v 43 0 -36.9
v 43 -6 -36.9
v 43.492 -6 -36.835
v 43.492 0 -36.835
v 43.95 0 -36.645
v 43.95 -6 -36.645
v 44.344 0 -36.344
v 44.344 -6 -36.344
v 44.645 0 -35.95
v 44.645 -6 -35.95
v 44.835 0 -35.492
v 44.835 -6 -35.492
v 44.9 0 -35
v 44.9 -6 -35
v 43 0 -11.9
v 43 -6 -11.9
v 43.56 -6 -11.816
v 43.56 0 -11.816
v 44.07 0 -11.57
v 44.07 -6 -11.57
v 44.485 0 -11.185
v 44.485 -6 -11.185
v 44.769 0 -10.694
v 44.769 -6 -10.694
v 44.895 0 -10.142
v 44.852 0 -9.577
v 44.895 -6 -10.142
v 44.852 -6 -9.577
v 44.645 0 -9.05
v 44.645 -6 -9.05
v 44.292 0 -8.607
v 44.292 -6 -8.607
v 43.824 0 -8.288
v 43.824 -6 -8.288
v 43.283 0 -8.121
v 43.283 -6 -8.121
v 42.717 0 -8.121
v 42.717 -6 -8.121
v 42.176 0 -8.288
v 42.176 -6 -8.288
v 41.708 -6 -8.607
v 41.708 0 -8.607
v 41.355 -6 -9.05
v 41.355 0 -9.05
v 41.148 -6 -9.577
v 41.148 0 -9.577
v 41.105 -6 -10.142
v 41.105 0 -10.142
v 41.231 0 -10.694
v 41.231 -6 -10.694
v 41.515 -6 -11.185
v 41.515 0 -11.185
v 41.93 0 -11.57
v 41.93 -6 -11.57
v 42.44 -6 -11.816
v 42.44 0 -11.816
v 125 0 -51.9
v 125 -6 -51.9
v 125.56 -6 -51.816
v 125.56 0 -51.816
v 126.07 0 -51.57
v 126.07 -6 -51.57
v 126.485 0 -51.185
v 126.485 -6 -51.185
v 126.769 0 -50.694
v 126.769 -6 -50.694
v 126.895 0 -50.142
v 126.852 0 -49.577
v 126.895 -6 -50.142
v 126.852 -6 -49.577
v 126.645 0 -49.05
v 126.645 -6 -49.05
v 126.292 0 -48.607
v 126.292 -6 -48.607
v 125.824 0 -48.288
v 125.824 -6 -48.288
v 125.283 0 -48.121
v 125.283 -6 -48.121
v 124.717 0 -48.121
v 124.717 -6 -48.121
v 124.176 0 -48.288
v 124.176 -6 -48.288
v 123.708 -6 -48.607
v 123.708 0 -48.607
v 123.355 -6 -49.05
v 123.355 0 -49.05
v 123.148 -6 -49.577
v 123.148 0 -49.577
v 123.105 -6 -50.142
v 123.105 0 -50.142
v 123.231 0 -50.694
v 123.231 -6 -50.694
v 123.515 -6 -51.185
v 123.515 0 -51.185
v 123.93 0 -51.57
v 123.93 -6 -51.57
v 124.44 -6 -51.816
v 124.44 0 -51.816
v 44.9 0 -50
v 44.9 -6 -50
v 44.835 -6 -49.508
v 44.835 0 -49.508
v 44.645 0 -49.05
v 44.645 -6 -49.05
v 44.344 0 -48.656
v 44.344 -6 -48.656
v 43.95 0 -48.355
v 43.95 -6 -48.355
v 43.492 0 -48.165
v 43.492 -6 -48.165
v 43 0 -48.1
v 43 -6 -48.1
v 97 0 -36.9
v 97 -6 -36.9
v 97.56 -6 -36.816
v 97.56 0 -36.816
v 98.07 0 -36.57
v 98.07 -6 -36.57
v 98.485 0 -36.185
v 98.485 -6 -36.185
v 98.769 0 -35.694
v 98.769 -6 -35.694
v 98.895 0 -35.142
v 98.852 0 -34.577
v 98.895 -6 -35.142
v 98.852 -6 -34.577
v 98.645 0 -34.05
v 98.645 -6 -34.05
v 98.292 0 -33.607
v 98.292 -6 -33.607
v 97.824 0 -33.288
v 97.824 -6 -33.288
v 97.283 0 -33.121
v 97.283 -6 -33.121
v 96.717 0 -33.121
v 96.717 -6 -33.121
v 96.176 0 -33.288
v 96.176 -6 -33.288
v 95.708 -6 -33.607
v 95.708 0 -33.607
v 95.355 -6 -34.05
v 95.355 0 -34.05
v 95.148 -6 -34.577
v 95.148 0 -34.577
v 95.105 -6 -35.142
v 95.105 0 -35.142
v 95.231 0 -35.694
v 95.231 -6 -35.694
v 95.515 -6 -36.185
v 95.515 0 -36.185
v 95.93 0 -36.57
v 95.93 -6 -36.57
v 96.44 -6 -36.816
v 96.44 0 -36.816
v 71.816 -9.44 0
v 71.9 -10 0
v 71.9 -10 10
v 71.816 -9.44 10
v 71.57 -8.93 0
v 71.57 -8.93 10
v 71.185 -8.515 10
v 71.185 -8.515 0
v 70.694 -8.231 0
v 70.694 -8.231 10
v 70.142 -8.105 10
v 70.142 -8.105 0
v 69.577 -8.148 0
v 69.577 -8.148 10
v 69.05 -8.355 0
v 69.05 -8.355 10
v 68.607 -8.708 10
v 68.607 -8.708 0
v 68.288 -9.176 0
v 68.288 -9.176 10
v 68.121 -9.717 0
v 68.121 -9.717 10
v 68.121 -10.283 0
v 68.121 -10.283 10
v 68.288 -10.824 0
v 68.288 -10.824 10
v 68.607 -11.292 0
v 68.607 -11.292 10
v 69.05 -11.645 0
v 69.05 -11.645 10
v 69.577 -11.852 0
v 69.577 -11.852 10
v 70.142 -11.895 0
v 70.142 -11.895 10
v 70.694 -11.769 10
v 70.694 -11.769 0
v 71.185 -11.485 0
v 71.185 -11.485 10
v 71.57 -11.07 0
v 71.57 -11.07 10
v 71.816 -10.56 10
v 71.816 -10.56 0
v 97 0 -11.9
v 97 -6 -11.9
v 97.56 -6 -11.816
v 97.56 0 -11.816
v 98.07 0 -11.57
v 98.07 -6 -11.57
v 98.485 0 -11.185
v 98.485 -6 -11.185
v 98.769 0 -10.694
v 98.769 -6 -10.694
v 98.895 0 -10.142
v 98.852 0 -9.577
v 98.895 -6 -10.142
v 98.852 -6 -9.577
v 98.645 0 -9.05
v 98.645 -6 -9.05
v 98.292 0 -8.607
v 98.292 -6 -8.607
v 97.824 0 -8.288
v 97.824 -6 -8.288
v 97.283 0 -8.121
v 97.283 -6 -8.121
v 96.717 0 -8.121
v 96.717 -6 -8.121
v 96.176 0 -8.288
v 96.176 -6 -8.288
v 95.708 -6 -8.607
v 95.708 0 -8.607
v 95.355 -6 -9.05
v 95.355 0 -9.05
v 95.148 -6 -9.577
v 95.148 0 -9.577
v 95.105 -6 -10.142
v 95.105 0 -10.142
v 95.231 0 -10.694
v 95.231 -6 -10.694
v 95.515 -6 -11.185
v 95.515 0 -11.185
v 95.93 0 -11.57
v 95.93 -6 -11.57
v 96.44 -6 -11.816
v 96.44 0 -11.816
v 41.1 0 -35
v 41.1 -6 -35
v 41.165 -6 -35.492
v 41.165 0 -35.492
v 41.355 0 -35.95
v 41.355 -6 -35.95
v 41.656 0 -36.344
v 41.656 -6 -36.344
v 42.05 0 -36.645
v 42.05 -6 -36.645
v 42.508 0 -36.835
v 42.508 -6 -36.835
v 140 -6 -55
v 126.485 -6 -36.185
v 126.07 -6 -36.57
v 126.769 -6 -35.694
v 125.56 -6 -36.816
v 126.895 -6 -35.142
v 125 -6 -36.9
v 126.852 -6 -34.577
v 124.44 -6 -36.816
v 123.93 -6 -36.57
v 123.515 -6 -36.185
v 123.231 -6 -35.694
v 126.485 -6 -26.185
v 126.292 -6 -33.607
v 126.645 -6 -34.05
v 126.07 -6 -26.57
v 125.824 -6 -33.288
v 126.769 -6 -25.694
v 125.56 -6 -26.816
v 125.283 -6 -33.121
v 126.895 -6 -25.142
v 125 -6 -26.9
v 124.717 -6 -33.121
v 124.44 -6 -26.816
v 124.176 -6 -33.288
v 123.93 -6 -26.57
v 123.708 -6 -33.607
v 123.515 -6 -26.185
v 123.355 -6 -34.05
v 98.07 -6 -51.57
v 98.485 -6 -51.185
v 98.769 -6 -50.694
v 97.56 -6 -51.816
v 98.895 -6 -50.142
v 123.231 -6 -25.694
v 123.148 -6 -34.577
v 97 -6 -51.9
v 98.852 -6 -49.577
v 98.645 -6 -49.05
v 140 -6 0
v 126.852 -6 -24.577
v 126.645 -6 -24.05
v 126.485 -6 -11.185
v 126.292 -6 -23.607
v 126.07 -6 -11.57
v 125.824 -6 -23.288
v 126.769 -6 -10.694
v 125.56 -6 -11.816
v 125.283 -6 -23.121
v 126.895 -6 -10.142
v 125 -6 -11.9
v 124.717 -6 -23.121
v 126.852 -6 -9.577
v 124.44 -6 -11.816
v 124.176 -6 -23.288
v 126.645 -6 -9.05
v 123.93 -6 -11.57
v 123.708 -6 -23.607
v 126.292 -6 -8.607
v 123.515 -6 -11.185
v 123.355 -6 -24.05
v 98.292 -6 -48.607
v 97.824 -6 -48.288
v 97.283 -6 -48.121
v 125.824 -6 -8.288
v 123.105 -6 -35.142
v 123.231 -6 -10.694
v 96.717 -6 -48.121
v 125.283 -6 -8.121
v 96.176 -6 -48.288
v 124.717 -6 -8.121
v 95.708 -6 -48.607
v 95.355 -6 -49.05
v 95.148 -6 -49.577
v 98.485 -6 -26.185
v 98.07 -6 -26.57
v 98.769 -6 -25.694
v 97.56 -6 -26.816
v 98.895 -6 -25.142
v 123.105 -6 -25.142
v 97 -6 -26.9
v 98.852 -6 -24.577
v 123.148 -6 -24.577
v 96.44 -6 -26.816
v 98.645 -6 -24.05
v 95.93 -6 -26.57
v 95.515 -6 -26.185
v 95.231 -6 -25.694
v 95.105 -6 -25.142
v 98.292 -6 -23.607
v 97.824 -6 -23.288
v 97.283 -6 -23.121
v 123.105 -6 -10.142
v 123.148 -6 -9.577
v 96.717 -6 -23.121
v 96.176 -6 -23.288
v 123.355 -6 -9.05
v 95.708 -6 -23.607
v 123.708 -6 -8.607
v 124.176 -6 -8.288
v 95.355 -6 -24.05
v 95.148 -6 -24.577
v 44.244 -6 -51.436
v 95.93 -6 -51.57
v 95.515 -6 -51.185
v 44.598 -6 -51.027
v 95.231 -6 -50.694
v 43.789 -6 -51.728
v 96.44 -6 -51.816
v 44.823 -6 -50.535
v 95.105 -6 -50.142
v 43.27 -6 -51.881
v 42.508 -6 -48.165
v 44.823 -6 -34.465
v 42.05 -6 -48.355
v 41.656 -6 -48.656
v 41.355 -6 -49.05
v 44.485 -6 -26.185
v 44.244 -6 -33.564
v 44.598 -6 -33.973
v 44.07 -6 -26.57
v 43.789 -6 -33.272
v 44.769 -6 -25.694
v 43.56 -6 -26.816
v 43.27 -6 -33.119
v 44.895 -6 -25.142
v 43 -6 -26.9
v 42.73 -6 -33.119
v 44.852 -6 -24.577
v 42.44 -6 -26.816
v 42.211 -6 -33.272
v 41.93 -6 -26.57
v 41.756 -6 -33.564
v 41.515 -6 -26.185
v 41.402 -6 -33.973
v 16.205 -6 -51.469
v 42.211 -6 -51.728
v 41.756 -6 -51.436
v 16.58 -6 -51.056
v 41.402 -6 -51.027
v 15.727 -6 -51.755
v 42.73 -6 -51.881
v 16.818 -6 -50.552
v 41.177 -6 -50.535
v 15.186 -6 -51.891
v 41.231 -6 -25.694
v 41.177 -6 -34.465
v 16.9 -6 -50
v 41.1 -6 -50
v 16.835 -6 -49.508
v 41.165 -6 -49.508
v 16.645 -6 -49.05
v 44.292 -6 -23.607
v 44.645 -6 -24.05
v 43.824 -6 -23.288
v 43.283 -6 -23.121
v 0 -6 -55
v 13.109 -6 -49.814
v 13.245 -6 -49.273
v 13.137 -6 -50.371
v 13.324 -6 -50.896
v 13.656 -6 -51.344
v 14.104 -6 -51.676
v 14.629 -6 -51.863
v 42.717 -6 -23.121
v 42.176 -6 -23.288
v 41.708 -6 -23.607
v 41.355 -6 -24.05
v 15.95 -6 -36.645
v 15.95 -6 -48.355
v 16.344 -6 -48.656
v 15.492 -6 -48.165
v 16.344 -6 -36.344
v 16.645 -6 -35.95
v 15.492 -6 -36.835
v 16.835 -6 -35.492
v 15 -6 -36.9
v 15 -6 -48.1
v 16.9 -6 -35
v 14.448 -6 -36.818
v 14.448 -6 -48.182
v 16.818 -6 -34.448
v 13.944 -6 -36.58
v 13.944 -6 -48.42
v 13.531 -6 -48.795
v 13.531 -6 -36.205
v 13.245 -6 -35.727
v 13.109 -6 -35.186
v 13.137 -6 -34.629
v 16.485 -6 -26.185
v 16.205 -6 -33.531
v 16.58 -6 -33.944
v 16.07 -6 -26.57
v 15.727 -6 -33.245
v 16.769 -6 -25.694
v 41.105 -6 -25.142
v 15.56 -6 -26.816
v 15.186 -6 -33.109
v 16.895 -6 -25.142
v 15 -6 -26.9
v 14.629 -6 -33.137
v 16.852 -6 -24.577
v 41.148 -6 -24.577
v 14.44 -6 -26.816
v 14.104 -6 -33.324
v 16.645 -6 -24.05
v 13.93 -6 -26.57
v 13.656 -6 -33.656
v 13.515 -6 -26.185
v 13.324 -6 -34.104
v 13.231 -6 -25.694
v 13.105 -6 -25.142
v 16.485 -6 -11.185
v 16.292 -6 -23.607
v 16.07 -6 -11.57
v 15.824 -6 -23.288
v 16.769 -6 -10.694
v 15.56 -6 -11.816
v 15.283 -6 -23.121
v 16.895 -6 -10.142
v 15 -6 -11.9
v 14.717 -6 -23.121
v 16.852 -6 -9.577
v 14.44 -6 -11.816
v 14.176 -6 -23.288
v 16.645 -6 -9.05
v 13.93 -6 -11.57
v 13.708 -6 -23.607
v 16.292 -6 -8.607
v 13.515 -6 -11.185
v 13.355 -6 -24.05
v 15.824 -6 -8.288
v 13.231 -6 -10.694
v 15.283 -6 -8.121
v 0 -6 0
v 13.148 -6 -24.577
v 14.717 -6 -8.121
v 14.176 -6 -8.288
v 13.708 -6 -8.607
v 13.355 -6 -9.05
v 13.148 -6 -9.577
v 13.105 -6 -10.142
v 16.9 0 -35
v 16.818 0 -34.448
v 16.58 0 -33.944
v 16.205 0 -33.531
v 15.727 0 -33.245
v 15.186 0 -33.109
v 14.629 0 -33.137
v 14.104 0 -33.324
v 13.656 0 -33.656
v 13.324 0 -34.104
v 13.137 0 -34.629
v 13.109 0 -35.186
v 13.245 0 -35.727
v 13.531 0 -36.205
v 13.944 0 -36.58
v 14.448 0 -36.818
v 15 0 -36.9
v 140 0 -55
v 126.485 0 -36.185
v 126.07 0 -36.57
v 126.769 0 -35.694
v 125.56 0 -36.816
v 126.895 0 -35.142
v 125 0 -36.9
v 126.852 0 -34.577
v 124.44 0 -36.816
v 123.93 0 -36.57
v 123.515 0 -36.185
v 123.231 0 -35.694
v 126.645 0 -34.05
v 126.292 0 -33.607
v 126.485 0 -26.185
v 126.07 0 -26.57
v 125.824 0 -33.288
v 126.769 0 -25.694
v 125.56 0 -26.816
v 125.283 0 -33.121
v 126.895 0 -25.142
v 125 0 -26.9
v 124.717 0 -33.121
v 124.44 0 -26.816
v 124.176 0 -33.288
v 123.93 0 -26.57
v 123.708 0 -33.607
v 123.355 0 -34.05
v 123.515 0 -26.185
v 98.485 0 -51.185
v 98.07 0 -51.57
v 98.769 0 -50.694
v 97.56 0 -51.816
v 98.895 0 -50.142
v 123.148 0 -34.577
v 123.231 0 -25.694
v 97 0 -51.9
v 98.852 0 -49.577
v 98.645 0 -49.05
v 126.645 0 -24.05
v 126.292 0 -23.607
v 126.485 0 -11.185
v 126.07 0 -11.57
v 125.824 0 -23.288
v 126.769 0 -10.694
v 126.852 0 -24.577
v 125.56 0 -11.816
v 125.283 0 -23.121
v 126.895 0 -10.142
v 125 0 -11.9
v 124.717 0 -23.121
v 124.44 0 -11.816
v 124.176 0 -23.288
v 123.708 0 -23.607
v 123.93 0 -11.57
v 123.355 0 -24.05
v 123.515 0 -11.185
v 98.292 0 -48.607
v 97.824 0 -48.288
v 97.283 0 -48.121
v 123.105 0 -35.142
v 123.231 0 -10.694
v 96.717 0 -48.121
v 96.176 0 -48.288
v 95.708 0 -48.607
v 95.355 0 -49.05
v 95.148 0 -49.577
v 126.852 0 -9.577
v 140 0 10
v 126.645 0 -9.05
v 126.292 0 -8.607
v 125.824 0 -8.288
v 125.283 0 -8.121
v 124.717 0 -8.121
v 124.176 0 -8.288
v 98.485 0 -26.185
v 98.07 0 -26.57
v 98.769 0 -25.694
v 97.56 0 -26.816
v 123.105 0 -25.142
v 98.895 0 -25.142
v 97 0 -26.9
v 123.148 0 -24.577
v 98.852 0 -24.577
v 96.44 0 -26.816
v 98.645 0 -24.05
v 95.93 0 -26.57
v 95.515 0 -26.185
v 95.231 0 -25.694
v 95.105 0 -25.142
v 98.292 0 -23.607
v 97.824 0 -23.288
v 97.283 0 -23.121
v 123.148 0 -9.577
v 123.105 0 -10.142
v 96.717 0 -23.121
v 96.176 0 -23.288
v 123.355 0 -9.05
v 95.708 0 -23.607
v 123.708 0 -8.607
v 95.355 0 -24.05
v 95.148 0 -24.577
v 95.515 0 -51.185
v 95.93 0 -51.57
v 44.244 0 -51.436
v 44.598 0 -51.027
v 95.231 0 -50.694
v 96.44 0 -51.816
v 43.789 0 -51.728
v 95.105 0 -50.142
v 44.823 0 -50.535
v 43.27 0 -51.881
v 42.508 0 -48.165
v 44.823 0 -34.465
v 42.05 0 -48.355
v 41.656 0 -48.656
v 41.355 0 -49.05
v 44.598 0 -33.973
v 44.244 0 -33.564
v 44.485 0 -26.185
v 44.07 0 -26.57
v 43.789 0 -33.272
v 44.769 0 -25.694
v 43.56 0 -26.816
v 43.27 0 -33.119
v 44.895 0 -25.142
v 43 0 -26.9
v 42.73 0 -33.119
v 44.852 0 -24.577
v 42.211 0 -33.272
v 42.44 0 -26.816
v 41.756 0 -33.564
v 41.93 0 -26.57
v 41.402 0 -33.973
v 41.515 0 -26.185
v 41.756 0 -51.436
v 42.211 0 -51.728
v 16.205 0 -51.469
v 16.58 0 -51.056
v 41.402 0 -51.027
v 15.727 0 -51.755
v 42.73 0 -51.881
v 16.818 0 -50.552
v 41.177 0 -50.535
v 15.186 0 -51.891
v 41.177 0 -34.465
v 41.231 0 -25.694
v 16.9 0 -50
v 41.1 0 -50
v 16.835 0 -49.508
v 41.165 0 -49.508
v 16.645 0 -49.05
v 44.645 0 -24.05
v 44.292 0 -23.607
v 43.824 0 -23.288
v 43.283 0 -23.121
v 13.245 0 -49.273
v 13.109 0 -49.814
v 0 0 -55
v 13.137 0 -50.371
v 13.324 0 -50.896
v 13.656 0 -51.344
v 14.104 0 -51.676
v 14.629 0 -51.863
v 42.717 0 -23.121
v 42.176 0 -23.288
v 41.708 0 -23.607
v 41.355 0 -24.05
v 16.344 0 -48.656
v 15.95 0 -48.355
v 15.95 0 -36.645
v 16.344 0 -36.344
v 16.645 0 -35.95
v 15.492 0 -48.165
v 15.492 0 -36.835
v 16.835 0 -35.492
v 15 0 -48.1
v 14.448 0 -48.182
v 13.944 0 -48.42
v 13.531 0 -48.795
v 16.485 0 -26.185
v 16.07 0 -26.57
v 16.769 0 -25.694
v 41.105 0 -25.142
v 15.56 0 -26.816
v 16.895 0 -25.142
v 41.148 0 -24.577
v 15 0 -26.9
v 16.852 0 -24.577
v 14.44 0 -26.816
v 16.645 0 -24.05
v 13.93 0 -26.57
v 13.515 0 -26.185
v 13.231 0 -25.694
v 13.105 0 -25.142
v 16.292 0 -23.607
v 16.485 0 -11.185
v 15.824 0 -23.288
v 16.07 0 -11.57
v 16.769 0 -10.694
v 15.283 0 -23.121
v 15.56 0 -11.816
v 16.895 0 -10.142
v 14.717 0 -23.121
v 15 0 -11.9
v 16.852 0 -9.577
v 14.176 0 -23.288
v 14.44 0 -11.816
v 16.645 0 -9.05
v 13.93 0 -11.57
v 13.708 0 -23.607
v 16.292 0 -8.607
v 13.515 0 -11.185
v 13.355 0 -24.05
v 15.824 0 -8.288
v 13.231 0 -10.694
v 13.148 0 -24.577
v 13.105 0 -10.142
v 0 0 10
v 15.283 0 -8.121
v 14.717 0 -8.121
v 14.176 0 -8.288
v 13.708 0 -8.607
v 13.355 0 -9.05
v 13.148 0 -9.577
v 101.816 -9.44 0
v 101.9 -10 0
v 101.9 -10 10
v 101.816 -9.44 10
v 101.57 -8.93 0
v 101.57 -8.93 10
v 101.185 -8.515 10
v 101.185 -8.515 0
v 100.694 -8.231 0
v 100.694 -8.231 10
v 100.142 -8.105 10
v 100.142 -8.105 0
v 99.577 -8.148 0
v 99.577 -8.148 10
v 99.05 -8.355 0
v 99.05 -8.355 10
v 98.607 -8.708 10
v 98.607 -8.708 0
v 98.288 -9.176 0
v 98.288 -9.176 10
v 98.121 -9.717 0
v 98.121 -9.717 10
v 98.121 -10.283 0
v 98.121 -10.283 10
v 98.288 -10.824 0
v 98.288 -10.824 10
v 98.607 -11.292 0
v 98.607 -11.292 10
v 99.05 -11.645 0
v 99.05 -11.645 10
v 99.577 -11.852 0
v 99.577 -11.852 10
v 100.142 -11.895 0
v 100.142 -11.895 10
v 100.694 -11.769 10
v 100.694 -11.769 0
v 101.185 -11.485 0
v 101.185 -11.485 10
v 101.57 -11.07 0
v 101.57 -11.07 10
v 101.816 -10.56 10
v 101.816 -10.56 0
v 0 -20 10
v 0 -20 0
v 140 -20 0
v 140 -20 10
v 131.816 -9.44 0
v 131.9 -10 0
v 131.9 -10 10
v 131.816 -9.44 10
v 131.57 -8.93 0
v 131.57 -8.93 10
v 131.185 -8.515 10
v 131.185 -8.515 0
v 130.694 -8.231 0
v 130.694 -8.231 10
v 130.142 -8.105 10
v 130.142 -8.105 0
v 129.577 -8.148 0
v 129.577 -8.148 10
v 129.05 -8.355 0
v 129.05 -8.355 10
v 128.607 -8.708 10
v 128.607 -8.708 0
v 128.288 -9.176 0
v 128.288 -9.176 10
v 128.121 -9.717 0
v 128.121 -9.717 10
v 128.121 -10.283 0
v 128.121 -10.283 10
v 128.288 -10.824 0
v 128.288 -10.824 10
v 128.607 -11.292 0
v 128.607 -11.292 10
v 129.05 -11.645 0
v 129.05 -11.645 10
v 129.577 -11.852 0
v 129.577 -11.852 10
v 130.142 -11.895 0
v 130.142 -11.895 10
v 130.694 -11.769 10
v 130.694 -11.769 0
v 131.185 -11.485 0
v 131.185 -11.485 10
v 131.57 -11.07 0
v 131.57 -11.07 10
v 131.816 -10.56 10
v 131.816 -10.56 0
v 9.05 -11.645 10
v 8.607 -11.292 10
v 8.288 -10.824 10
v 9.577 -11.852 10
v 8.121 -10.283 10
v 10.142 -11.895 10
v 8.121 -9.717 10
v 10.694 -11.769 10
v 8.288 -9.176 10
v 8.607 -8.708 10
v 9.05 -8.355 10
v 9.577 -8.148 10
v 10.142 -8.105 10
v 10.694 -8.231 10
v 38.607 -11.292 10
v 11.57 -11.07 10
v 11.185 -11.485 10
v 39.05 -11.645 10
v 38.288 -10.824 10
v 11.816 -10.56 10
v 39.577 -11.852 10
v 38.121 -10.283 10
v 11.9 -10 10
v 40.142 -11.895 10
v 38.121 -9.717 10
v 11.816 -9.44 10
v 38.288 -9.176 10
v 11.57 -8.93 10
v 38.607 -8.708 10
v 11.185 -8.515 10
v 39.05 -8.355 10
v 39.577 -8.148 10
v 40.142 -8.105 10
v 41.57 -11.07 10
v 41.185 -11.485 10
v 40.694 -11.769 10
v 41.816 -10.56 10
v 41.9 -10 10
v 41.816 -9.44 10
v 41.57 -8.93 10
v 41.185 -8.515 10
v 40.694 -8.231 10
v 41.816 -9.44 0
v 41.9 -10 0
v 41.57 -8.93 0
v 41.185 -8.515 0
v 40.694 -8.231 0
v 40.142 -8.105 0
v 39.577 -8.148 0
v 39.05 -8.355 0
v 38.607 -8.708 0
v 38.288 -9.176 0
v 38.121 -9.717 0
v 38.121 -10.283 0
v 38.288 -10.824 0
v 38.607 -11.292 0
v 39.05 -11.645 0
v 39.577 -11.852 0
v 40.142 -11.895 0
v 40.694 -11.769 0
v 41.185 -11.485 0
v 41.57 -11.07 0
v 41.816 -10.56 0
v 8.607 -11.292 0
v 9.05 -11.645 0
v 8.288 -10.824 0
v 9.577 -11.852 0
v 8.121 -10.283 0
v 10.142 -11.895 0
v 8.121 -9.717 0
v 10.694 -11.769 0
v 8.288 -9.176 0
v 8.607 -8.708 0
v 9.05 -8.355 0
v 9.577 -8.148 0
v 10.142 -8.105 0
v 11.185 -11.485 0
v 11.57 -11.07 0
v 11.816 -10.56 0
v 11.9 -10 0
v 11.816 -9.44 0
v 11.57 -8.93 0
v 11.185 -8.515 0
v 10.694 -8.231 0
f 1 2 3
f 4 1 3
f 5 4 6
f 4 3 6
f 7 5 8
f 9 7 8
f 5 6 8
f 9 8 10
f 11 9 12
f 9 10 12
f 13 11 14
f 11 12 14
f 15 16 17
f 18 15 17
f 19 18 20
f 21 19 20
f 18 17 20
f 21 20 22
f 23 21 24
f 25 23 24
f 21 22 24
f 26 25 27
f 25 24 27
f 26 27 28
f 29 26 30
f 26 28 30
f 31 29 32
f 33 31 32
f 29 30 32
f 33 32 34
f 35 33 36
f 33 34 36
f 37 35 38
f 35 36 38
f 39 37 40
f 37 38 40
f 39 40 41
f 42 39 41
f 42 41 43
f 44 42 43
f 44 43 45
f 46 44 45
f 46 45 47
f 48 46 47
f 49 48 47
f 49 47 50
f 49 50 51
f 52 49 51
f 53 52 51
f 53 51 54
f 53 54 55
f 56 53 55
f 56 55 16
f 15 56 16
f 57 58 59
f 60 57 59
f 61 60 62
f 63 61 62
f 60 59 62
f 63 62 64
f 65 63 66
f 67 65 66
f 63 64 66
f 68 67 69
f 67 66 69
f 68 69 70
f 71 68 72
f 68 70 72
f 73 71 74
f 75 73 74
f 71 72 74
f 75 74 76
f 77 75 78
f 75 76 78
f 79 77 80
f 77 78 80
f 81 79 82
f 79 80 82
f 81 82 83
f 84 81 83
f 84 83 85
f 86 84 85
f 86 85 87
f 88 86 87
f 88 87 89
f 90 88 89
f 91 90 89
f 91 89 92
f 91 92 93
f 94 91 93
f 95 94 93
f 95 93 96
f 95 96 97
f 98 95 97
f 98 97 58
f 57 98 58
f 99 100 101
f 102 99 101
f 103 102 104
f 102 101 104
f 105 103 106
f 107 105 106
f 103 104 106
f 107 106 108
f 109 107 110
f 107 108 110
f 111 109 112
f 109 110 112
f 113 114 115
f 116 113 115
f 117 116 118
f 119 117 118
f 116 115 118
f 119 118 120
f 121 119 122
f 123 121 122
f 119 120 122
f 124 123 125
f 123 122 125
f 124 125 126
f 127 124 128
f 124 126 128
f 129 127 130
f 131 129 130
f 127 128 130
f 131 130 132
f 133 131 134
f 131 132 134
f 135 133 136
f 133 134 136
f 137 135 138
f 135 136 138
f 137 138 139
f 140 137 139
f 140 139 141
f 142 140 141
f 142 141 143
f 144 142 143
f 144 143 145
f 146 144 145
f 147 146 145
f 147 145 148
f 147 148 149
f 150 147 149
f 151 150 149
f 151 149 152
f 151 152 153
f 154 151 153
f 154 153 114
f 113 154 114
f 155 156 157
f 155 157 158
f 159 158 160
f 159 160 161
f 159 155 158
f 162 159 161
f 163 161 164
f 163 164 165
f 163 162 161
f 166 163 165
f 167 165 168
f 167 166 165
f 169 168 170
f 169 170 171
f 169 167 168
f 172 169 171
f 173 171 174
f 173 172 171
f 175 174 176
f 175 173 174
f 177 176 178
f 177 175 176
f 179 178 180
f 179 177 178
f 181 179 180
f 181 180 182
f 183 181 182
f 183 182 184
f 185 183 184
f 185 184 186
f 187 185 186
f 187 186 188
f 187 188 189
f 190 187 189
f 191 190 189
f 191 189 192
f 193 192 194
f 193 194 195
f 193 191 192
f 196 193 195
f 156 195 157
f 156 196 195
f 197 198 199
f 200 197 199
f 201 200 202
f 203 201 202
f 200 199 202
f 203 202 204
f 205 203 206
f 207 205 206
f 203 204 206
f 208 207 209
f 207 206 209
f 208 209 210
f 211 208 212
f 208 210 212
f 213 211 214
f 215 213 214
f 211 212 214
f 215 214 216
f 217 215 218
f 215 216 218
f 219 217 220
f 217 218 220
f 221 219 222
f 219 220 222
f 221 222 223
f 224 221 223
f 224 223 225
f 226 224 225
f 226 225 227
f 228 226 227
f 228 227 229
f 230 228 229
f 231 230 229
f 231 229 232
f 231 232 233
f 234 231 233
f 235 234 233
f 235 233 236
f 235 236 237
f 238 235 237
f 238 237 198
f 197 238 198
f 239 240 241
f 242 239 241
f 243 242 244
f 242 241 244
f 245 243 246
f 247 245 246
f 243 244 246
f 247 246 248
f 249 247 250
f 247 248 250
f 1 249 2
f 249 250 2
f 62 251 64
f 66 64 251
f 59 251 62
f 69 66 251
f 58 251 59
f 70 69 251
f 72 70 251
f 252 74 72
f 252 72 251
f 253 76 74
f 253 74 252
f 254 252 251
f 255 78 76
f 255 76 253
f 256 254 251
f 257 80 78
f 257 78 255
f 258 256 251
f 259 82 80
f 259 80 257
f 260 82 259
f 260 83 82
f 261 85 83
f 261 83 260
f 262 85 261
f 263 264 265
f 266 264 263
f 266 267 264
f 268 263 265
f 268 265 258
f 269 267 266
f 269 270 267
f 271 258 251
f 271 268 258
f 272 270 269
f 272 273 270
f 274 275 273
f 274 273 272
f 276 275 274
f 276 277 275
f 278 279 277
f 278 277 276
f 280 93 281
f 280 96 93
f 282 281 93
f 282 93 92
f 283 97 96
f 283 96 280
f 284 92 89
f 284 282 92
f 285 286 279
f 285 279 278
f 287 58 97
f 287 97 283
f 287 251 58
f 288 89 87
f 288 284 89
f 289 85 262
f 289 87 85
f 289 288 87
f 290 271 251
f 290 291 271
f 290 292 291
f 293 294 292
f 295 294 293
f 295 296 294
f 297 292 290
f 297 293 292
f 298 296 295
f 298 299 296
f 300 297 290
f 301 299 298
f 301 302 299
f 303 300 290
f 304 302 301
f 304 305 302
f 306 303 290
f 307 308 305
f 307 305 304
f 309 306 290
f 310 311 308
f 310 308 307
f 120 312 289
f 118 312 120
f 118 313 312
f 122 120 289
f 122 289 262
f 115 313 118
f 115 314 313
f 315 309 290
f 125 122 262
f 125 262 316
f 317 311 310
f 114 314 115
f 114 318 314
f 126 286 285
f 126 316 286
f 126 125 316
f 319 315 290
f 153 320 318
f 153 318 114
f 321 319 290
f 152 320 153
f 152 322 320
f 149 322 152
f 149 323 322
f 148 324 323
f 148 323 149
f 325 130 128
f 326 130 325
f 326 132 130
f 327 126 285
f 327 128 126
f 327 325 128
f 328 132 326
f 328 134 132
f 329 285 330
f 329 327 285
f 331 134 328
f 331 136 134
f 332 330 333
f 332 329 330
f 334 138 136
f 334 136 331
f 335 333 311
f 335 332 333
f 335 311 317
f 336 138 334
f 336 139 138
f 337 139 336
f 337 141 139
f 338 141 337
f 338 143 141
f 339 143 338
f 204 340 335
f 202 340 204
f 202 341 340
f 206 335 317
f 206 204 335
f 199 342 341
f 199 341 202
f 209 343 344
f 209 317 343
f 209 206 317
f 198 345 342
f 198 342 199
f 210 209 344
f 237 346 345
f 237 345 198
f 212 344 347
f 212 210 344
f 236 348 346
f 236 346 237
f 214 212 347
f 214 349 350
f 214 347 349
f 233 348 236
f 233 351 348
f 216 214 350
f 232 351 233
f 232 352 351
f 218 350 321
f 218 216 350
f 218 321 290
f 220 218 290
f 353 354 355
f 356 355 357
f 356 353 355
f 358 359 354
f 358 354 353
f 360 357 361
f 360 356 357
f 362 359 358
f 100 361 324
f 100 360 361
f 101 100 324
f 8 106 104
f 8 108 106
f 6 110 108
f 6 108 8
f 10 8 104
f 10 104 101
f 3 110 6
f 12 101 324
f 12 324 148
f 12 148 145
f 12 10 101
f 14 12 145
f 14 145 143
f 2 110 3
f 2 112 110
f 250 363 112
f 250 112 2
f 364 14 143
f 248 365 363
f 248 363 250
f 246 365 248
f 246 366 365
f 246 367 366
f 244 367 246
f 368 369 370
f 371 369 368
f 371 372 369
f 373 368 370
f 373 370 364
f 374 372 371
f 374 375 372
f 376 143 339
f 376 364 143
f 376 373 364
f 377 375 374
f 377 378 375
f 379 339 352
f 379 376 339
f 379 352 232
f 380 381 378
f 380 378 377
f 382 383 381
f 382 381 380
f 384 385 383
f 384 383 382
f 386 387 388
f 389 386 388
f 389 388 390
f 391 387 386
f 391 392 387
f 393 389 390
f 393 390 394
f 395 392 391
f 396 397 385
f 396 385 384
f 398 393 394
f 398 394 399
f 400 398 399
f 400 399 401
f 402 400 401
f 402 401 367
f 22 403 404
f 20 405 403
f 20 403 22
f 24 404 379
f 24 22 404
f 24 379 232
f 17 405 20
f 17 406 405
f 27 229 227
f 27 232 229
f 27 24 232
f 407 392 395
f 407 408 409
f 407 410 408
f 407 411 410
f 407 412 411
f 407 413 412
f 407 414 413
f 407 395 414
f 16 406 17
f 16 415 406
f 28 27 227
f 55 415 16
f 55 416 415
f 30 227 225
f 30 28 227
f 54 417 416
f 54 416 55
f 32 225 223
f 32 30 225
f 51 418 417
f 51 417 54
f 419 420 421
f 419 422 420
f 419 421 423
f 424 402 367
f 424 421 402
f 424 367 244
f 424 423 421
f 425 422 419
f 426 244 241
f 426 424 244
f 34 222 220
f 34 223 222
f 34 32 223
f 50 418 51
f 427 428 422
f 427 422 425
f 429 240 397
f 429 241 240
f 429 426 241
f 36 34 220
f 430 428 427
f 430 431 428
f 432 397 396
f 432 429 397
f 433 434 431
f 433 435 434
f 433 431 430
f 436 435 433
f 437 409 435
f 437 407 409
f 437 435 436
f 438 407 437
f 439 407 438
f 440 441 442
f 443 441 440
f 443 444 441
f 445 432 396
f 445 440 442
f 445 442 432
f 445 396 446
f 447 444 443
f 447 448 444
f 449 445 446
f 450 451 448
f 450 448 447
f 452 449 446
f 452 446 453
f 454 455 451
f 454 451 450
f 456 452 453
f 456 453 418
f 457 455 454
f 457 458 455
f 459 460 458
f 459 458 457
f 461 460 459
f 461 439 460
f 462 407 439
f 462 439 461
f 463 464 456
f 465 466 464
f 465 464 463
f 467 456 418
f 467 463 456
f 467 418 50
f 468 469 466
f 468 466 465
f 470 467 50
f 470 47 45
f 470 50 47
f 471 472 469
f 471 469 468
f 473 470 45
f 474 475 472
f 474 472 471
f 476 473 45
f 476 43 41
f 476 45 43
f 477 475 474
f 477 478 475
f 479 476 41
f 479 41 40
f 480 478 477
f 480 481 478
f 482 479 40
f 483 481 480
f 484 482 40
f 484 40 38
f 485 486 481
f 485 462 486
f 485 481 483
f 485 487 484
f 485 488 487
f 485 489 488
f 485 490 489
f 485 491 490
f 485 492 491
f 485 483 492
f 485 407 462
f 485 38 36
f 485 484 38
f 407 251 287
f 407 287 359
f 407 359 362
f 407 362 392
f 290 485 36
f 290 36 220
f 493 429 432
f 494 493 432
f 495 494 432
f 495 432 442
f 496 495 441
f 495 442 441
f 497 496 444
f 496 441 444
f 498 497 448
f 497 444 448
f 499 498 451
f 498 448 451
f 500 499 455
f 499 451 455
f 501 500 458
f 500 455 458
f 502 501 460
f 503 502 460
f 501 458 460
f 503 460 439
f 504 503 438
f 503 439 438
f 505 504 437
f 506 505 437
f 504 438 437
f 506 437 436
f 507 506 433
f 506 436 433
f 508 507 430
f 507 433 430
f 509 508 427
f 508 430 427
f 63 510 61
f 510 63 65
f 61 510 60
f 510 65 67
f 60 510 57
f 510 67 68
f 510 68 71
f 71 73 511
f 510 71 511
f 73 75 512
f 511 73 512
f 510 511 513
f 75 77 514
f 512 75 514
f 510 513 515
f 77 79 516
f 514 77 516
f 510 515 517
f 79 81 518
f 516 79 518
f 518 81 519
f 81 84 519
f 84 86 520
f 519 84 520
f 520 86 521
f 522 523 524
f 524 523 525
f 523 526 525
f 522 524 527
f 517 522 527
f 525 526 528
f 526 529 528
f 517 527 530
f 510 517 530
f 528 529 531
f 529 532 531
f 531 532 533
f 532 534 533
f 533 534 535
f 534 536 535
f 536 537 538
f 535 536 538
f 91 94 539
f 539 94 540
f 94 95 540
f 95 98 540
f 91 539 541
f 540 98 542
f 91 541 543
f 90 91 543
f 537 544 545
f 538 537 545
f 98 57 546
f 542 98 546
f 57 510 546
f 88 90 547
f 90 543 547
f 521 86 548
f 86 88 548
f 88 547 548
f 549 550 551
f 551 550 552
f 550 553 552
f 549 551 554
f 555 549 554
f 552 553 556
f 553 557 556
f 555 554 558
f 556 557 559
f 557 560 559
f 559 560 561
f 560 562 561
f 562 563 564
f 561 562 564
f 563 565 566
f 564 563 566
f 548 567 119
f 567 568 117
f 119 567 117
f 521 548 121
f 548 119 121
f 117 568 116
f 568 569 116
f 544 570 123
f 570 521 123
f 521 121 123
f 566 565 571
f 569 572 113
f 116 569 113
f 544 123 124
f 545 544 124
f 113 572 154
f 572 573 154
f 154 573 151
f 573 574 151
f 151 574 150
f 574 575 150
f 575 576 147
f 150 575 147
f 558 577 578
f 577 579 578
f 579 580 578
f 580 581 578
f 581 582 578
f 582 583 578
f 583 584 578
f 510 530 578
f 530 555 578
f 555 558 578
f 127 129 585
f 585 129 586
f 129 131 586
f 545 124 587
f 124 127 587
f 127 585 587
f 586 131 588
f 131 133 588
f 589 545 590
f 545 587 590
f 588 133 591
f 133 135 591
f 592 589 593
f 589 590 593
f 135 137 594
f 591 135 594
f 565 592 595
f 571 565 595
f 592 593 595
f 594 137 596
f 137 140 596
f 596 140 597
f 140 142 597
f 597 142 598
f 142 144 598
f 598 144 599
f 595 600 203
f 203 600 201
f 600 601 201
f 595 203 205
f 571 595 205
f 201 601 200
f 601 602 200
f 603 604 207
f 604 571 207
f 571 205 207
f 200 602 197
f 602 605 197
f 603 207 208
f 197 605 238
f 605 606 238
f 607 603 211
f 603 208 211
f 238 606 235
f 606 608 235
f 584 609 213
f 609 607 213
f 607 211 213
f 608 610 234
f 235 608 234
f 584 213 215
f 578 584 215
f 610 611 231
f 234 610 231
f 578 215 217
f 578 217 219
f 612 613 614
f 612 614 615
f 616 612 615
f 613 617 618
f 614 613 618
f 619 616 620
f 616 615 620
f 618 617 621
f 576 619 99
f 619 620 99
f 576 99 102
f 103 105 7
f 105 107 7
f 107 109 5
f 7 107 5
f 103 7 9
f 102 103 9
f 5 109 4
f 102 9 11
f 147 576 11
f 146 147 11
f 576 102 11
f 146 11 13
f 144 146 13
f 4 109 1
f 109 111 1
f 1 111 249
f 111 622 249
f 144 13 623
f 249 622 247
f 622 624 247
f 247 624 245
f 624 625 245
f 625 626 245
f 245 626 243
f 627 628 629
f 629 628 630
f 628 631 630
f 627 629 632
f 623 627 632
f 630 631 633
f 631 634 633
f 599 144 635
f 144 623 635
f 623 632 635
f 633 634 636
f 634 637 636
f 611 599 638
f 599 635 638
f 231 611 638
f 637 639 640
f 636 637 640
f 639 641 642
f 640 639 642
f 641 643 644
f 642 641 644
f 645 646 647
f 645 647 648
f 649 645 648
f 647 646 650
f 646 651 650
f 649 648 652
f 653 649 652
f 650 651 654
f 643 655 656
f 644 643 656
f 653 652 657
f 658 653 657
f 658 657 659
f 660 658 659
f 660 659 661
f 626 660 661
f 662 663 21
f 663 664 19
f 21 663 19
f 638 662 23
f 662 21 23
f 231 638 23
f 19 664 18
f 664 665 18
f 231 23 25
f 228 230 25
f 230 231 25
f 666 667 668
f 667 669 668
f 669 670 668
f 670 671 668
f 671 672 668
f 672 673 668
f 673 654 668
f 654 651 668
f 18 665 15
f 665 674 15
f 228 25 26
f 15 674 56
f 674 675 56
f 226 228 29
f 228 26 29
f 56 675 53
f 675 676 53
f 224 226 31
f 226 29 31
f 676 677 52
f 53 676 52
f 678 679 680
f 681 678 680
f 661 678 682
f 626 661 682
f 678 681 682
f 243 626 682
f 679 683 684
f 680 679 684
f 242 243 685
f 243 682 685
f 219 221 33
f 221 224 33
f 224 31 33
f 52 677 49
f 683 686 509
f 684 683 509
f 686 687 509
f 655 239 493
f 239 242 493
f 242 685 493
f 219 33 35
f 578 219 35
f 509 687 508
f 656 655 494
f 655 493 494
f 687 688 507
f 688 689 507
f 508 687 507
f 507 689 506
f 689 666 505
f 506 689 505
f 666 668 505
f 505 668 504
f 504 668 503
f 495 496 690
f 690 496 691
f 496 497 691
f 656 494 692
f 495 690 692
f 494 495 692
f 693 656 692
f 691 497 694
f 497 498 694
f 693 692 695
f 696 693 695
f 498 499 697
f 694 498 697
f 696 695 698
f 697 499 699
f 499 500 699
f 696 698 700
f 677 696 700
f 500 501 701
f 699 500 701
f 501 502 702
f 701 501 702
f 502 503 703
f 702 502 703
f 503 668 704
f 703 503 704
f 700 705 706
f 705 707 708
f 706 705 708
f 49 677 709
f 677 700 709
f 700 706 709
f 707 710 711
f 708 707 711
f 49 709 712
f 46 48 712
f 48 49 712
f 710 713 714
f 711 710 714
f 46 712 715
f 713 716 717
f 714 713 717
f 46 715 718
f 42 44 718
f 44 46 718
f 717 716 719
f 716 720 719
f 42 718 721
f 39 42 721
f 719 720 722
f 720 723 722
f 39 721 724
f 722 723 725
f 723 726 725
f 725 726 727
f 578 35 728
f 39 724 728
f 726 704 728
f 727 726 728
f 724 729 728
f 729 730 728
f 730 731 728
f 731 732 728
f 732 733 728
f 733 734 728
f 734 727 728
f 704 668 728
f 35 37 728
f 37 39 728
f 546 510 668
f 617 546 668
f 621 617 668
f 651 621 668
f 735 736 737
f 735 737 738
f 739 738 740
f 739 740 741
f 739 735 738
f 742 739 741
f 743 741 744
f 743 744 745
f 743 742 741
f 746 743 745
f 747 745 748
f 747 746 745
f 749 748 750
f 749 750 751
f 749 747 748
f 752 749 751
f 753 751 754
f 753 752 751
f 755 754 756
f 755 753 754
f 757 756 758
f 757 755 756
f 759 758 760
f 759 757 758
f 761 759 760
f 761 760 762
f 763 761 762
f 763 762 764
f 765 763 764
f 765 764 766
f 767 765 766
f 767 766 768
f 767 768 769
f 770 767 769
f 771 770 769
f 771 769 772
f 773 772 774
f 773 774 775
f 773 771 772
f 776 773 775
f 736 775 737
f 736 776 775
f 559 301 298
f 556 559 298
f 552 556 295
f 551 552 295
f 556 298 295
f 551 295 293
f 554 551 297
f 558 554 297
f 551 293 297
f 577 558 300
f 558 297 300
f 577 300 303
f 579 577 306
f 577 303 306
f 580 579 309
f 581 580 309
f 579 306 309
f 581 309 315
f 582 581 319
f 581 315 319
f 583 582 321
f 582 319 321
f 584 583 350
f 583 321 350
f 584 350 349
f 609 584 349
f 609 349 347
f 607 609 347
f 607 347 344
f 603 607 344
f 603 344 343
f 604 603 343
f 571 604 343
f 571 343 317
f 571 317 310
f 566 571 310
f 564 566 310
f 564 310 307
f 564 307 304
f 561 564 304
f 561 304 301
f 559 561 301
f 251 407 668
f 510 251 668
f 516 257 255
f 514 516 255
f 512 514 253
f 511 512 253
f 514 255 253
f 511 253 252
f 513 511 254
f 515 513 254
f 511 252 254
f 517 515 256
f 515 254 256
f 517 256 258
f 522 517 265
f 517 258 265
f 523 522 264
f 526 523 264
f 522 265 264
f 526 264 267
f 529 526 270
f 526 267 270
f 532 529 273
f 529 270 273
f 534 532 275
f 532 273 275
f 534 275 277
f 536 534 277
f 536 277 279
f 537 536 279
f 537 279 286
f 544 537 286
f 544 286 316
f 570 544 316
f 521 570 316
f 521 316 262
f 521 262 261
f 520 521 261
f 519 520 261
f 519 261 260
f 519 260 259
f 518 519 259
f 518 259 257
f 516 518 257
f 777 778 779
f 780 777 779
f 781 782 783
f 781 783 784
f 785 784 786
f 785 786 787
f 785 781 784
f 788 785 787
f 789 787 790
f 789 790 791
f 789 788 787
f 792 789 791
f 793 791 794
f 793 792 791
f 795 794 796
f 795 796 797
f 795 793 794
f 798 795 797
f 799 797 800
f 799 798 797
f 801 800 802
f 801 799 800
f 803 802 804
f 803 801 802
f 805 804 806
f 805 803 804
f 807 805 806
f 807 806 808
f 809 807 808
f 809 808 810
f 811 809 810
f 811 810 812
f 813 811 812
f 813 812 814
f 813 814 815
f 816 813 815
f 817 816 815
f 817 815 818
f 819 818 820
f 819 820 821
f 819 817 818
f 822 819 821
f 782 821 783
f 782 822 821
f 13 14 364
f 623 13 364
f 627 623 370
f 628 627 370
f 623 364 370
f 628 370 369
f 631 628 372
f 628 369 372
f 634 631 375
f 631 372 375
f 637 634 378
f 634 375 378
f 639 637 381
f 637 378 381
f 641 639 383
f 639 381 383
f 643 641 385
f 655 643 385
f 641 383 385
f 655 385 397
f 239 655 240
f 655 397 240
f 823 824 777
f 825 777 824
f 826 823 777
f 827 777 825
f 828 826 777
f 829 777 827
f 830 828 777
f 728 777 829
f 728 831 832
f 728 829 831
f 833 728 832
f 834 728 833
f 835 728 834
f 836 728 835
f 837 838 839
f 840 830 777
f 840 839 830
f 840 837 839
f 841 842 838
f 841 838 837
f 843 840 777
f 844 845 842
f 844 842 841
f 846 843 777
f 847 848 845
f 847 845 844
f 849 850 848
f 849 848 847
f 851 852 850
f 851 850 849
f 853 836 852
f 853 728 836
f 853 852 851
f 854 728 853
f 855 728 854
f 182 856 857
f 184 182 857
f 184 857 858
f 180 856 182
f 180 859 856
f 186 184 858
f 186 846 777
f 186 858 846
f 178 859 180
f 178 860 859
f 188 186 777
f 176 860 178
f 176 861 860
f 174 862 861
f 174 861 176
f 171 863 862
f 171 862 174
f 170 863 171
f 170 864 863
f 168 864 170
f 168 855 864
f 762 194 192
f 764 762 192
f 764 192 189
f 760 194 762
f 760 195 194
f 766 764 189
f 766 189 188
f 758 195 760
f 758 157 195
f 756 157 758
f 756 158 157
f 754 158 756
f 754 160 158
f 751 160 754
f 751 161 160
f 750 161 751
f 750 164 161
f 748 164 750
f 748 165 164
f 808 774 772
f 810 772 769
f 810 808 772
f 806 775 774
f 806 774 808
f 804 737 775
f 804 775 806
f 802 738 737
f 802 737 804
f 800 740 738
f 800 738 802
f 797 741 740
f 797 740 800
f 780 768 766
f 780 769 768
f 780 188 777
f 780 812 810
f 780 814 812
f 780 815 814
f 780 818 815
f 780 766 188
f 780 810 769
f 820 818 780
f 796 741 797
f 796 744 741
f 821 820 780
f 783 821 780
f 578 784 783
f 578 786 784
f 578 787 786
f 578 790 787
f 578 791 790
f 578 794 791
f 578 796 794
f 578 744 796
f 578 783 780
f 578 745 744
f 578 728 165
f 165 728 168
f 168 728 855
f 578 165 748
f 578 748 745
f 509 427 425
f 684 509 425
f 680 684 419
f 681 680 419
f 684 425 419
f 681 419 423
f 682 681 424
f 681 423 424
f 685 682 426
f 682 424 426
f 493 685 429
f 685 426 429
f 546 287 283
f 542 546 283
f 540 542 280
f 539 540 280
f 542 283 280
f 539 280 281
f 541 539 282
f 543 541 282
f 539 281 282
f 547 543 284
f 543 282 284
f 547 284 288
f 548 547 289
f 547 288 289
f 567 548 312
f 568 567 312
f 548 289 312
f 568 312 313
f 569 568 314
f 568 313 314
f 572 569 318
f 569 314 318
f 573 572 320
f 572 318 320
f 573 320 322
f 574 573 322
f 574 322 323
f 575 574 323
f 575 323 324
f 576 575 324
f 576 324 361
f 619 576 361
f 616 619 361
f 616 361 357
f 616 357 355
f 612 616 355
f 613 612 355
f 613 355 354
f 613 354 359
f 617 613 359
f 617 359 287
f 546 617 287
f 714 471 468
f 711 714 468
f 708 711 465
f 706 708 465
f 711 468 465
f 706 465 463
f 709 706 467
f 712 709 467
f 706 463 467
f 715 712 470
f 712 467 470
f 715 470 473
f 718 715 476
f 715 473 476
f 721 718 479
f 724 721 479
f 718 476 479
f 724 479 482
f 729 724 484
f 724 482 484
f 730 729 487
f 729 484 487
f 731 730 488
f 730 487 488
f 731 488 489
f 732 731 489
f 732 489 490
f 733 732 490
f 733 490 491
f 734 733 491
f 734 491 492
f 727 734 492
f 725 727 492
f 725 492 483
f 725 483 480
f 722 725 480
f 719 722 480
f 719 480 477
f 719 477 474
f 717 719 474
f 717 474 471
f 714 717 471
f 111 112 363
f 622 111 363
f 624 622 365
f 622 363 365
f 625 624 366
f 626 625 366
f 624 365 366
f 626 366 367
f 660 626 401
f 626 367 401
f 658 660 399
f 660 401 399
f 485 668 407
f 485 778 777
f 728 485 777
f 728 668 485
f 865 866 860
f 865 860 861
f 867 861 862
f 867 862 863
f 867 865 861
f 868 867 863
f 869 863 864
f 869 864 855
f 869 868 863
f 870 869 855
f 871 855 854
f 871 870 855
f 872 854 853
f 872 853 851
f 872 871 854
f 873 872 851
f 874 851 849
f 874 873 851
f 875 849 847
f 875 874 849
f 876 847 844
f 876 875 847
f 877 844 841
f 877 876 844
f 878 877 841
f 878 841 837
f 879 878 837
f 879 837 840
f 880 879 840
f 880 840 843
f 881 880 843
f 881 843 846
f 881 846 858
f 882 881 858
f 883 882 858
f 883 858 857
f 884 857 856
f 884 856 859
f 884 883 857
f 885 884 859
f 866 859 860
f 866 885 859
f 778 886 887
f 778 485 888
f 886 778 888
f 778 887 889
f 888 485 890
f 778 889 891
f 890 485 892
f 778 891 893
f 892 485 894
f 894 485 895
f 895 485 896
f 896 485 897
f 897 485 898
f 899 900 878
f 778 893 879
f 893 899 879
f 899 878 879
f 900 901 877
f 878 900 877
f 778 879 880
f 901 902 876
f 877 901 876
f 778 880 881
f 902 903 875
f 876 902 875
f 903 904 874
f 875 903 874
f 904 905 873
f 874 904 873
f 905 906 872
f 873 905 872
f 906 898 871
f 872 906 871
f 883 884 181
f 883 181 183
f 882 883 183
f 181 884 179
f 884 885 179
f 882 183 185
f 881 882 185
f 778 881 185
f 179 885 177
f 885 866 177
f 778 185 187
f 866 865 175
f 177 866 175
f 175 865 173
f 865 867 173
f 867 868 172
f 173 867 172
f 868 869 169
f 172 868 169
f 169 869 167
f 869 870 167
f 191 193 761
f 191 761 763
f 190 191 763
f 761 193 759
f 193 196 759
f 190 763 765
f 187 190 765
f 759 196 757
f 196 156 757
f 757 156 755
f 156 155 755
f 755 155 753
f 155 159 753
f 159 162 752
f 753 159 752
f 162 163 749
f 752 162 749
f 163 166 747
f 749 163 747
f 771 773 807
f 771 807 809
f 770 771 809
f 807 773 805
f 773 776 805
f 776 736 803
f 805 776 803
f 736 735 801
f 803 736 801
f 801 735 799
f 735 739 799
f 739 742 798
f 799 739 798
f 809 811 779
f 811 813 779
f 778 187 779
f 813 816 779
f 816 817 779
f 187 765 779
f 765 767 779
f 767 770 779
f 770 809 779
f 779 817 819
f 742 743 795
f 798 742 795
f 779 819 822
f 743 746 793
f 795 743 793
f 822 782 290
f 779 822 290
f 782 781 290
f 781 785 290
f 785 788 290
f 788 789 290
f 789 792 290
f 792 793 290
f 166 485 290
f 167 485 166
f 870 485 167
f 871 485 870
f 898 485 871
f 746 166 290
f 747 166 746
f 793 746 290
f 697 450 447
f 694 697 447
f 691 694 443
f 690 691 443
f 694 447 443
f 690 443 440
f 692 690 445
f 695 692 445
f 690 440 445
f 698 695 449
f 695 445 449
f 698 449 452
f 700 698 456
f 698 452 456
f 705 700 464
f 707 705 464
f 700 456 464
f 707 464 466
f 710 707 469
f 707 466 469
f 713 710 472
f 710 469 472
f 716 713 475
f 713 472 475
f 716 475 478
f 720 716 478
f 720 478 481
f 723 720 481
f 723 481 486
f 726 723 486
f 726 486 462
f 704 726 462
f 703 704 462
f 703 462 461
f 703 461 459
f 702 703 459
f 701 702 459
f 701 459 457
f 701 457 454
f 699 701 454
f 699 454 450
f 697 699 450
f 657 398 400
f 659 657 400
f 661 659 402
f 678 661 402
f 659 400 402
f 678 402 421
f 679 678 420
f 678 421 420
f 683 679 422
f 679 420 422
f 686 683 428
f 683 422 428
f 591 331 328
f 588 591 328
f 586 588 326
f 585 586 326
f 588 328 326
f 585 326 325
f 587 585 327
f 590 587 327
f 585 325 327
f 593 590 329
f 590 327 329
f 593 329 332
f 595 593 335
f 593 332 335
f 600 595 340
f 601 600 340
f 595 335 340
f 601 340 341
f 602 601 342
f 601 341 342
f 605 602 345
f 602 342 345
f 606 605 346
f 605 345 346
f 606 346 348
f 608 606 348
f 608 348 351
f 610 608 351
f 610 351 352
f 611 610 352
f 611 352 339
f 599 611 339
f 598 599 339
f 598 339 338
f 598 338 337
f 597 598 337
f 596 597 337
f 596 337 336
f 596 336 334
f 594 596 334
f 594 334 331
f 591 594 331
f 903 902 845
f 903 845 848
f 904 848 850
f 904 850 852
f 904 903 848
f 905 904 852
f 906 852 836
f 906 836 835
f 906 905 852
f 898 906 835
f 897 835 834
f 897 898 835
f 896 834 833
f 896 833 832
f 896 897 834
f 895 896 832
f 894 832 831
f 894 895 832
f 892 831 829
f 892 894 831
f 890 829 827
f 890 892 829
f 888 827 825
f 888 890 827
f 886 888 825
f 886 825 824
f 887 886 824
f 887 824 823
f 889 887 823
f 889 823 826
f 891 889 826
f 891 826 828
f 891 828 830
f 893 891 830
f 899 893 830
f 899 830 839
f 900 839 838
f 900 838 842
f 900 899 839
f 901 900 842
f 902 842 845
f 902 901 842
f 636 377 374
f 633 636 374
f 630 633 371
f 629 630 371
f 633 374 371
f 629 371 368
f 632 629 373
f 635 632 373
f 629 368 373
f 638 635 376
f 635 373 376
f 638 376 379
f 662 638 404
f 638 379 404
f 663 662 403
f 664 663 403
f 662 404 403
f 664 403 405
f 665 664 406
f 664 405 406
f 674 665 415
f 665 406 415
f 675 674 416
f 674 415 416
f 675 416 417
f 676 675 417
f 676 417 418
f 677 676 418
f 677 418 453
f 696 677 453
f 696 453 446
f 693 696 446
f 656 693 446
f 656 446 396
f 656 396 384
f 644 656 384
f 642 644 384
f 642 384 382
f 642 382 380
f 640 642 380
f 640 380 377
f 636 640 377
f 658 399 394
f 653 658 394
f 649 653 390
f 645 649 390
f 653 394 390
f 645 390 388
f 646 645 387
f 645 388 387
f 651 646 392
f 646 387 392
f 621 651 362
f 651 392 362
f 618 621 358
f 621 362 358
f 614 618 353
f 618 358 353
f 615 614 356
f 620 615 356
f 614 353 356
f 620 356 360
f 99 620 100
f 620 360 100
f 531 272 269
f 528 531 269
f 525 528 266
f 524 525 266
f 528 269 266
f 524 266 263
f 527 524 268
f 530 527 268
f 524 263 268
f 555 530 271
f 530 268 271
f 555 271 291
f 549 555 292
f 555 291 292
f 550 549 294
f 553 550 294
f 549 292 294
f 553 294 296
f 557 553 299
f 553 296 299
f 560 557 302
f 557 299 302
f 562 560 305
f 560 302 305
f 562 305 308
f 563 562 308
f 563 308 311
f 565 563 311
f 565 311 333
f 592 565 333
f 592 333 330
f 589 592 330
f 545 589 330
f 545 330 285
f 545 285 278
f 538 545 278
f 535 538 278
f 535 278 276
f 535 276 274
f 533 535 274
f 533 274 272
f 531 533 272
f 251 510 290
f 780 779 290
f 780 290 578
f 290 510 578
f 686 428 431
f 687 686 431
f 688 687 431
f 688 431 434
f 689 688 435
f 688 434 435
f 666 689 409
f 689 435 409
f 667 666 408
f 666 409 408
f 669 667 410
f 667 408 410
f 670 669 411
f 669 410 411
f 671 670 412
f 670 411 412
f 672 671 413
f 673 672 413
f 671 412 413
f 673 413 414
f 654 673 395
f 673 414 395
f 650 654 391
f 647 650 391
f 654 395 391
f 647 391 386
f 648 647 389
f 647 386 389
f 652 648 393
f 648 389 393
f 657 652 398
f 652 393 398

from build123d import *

# Parameters (mm, degrees)
SKETCH_1_W          = 140
SKETCH_1_H          = 20
SKETCH_1_R          = 1.9
EXTRUDE_1_DEPTH     = 10
SKETCH_2_W          = 65
SKETCH_2_H          = 6
EXTRUDE_2_DEPTH     = 140
SKETCH_3_R          = 1.9
CUT_EXTRUDE_1_DEPTH = 10


with BuildPart() as part:
    # 草图1 → 凸台-拉伸1 (new body)
    with BuildSketch(Plane.XY):
        with Locations((70, -10)):
            Rectangle(SKETCH_1_W, SKETCH_1_H)
        with Locations((10, -10)):
            Circle(SKETCH_1_R, mode=Mode.SUBTRACT)
        with Locations((40, -10)):
            Circle(SKETCH_1_R, mode=Mode.SUBTRACT)
        with Locations((70, -10)):
            Circle(SKETCH_1_R, mode=Mode.SUBTRACT)
        with Locations((100, -10)):
            Circle(SKETCH_1_R, mode=Mode.SUBTRACT)
        with Locations((130, -10)):
            Circle(SKETCH_1_R, mode=Mode.SUBTRACT)
    extrude(amount=EXTRUDE_1_DEPTH)

    # 草图2 → 凸台-拉伸2 (add, through all)
    with BuildSketch(Plane.ZY):
        with Locations((-22.5, -3)):
            Rectangle(SKETCH_2_W, SKETCH_2_H)
    extrude(amount=-EXTRUDE_2_DEPTH)

    # 草图3 → 切除-拉伸1 (cut)
    with BuildSketch(Plane.XZ.offset(6)):
        with BuildLine():
            ThreePointArc((44.9, -35), (43, -33.1), (41.1, -35))
            Line((41.1, -35), (43, -35))
            Line((43, -35), (43, -36.9))
            ThreePointArc((43, -36.9), (44.343502884, -36.343502884), (44.9, -35))
        make_face()
        with BuildLine():
            Line((43, -35), (41.1, -35))
            ThreePointArc((41.1, -35), (41.656497116, -36.343502884), (43, -36.9))
            Line((43, -36.9), (43, -35))
        make_face()
        with BuildLine():
            ThreePointArc((44.9, -50), (44.343502884, -48.656497116), (43, -48.1))
            Line((43, -48.1), (43, -50))
            Line((43, -50), (41.1, -50))
            ThreePointArc((41.1, -50), (43, -51.9), (44.9, -50))
        make_face()
        with BuildLine():
            Line((43, -50), (43, -48.1))
            ThreePointArc((43, -48.1), (41.656497116, -48.656497116), (41.1, -50))
            Line((41.1, -50), (43, -50))
        make_face()
        with BuildLine():
            ThreePointArc((16.9, -50), (16.343502884, -48.656497116), (15, -48.1))
            Line((15, -48.1), (15, -50))
            Line((15, -50), (16.9, -50))
        make_face()
        with BuildLine():
            Line((15, -50), (15, -48.1))
            ThreePointArc((15, -48.1), (13.656497116, -51.343502884), (16.9, -50))
            Line((16.9, -50), (15, -50))
        make_face()
        with BuildLine():
            Line((15, -36.9), (15, -35))
            Line((15, -35), (16.9, -35))
            ThreePointArc((16.9, -35), (13.656497116, -33.656497116), (15, -36.9))
        make_face()
        with BuildLine():
            Line((16.9, -35), (15, -35))
            Line((15, -35), (15, -36.9))
            ThreePointArc((15, -36.9), (16.343502884, -36.343502884), (16.9, -35))
        make_face()
        with Locations(Location((15, -10, 0), (0, 0, 270))):
            Circle(SKETCH_3_R)
        with Locations(Location((15, -25, 0), (0, 0, 270))):
            Circle(SKETCH_3_R)
        with Locations(Location((43, -25, 0), (0, 0, 270))):
            Circle(SKETCH_3_R)
        with Locations(Location((43, -10, 0), (0, 0, 270))):
            Circle(SKETCH_3_R)
        with Locations(Location((97, -10, 0), (0, 0, 270))):
            Circle(SKETCH_3_R)
        with Locations(Location((97, -35, 0), (0, 0, 270))):
            Circle(SKETCH_3_R)
        with Locations(Location((97, -50, 0), (0, 0, 270))):
            Circle(SKETCH_3_R)
        with Locations(Location((125, -50, 0), (0, 0, 270))):
            Circle(SKETCH_3_R)
        with Locations(Location((125, -35, 0), (0, 0, 270))):
            Circle(SKETCH_3_R)
        with Locations(Location((125, -25, 0), (0, 0, 270))):
            Circle(SKETCH_3_R)
        with Locations(Location((125, -10, 0), (0, 0, 270))):
            Circle(SKETCH_3_R)
        with Locations(Location((97, -25, 0), (0, 0, 270))):
            Circle(SKETCH_3_R)
    extrude(amount=-CUT_EXTRUDE_1_DEPTH, mode=Mode.SUBTRACT)


solid = part.part
